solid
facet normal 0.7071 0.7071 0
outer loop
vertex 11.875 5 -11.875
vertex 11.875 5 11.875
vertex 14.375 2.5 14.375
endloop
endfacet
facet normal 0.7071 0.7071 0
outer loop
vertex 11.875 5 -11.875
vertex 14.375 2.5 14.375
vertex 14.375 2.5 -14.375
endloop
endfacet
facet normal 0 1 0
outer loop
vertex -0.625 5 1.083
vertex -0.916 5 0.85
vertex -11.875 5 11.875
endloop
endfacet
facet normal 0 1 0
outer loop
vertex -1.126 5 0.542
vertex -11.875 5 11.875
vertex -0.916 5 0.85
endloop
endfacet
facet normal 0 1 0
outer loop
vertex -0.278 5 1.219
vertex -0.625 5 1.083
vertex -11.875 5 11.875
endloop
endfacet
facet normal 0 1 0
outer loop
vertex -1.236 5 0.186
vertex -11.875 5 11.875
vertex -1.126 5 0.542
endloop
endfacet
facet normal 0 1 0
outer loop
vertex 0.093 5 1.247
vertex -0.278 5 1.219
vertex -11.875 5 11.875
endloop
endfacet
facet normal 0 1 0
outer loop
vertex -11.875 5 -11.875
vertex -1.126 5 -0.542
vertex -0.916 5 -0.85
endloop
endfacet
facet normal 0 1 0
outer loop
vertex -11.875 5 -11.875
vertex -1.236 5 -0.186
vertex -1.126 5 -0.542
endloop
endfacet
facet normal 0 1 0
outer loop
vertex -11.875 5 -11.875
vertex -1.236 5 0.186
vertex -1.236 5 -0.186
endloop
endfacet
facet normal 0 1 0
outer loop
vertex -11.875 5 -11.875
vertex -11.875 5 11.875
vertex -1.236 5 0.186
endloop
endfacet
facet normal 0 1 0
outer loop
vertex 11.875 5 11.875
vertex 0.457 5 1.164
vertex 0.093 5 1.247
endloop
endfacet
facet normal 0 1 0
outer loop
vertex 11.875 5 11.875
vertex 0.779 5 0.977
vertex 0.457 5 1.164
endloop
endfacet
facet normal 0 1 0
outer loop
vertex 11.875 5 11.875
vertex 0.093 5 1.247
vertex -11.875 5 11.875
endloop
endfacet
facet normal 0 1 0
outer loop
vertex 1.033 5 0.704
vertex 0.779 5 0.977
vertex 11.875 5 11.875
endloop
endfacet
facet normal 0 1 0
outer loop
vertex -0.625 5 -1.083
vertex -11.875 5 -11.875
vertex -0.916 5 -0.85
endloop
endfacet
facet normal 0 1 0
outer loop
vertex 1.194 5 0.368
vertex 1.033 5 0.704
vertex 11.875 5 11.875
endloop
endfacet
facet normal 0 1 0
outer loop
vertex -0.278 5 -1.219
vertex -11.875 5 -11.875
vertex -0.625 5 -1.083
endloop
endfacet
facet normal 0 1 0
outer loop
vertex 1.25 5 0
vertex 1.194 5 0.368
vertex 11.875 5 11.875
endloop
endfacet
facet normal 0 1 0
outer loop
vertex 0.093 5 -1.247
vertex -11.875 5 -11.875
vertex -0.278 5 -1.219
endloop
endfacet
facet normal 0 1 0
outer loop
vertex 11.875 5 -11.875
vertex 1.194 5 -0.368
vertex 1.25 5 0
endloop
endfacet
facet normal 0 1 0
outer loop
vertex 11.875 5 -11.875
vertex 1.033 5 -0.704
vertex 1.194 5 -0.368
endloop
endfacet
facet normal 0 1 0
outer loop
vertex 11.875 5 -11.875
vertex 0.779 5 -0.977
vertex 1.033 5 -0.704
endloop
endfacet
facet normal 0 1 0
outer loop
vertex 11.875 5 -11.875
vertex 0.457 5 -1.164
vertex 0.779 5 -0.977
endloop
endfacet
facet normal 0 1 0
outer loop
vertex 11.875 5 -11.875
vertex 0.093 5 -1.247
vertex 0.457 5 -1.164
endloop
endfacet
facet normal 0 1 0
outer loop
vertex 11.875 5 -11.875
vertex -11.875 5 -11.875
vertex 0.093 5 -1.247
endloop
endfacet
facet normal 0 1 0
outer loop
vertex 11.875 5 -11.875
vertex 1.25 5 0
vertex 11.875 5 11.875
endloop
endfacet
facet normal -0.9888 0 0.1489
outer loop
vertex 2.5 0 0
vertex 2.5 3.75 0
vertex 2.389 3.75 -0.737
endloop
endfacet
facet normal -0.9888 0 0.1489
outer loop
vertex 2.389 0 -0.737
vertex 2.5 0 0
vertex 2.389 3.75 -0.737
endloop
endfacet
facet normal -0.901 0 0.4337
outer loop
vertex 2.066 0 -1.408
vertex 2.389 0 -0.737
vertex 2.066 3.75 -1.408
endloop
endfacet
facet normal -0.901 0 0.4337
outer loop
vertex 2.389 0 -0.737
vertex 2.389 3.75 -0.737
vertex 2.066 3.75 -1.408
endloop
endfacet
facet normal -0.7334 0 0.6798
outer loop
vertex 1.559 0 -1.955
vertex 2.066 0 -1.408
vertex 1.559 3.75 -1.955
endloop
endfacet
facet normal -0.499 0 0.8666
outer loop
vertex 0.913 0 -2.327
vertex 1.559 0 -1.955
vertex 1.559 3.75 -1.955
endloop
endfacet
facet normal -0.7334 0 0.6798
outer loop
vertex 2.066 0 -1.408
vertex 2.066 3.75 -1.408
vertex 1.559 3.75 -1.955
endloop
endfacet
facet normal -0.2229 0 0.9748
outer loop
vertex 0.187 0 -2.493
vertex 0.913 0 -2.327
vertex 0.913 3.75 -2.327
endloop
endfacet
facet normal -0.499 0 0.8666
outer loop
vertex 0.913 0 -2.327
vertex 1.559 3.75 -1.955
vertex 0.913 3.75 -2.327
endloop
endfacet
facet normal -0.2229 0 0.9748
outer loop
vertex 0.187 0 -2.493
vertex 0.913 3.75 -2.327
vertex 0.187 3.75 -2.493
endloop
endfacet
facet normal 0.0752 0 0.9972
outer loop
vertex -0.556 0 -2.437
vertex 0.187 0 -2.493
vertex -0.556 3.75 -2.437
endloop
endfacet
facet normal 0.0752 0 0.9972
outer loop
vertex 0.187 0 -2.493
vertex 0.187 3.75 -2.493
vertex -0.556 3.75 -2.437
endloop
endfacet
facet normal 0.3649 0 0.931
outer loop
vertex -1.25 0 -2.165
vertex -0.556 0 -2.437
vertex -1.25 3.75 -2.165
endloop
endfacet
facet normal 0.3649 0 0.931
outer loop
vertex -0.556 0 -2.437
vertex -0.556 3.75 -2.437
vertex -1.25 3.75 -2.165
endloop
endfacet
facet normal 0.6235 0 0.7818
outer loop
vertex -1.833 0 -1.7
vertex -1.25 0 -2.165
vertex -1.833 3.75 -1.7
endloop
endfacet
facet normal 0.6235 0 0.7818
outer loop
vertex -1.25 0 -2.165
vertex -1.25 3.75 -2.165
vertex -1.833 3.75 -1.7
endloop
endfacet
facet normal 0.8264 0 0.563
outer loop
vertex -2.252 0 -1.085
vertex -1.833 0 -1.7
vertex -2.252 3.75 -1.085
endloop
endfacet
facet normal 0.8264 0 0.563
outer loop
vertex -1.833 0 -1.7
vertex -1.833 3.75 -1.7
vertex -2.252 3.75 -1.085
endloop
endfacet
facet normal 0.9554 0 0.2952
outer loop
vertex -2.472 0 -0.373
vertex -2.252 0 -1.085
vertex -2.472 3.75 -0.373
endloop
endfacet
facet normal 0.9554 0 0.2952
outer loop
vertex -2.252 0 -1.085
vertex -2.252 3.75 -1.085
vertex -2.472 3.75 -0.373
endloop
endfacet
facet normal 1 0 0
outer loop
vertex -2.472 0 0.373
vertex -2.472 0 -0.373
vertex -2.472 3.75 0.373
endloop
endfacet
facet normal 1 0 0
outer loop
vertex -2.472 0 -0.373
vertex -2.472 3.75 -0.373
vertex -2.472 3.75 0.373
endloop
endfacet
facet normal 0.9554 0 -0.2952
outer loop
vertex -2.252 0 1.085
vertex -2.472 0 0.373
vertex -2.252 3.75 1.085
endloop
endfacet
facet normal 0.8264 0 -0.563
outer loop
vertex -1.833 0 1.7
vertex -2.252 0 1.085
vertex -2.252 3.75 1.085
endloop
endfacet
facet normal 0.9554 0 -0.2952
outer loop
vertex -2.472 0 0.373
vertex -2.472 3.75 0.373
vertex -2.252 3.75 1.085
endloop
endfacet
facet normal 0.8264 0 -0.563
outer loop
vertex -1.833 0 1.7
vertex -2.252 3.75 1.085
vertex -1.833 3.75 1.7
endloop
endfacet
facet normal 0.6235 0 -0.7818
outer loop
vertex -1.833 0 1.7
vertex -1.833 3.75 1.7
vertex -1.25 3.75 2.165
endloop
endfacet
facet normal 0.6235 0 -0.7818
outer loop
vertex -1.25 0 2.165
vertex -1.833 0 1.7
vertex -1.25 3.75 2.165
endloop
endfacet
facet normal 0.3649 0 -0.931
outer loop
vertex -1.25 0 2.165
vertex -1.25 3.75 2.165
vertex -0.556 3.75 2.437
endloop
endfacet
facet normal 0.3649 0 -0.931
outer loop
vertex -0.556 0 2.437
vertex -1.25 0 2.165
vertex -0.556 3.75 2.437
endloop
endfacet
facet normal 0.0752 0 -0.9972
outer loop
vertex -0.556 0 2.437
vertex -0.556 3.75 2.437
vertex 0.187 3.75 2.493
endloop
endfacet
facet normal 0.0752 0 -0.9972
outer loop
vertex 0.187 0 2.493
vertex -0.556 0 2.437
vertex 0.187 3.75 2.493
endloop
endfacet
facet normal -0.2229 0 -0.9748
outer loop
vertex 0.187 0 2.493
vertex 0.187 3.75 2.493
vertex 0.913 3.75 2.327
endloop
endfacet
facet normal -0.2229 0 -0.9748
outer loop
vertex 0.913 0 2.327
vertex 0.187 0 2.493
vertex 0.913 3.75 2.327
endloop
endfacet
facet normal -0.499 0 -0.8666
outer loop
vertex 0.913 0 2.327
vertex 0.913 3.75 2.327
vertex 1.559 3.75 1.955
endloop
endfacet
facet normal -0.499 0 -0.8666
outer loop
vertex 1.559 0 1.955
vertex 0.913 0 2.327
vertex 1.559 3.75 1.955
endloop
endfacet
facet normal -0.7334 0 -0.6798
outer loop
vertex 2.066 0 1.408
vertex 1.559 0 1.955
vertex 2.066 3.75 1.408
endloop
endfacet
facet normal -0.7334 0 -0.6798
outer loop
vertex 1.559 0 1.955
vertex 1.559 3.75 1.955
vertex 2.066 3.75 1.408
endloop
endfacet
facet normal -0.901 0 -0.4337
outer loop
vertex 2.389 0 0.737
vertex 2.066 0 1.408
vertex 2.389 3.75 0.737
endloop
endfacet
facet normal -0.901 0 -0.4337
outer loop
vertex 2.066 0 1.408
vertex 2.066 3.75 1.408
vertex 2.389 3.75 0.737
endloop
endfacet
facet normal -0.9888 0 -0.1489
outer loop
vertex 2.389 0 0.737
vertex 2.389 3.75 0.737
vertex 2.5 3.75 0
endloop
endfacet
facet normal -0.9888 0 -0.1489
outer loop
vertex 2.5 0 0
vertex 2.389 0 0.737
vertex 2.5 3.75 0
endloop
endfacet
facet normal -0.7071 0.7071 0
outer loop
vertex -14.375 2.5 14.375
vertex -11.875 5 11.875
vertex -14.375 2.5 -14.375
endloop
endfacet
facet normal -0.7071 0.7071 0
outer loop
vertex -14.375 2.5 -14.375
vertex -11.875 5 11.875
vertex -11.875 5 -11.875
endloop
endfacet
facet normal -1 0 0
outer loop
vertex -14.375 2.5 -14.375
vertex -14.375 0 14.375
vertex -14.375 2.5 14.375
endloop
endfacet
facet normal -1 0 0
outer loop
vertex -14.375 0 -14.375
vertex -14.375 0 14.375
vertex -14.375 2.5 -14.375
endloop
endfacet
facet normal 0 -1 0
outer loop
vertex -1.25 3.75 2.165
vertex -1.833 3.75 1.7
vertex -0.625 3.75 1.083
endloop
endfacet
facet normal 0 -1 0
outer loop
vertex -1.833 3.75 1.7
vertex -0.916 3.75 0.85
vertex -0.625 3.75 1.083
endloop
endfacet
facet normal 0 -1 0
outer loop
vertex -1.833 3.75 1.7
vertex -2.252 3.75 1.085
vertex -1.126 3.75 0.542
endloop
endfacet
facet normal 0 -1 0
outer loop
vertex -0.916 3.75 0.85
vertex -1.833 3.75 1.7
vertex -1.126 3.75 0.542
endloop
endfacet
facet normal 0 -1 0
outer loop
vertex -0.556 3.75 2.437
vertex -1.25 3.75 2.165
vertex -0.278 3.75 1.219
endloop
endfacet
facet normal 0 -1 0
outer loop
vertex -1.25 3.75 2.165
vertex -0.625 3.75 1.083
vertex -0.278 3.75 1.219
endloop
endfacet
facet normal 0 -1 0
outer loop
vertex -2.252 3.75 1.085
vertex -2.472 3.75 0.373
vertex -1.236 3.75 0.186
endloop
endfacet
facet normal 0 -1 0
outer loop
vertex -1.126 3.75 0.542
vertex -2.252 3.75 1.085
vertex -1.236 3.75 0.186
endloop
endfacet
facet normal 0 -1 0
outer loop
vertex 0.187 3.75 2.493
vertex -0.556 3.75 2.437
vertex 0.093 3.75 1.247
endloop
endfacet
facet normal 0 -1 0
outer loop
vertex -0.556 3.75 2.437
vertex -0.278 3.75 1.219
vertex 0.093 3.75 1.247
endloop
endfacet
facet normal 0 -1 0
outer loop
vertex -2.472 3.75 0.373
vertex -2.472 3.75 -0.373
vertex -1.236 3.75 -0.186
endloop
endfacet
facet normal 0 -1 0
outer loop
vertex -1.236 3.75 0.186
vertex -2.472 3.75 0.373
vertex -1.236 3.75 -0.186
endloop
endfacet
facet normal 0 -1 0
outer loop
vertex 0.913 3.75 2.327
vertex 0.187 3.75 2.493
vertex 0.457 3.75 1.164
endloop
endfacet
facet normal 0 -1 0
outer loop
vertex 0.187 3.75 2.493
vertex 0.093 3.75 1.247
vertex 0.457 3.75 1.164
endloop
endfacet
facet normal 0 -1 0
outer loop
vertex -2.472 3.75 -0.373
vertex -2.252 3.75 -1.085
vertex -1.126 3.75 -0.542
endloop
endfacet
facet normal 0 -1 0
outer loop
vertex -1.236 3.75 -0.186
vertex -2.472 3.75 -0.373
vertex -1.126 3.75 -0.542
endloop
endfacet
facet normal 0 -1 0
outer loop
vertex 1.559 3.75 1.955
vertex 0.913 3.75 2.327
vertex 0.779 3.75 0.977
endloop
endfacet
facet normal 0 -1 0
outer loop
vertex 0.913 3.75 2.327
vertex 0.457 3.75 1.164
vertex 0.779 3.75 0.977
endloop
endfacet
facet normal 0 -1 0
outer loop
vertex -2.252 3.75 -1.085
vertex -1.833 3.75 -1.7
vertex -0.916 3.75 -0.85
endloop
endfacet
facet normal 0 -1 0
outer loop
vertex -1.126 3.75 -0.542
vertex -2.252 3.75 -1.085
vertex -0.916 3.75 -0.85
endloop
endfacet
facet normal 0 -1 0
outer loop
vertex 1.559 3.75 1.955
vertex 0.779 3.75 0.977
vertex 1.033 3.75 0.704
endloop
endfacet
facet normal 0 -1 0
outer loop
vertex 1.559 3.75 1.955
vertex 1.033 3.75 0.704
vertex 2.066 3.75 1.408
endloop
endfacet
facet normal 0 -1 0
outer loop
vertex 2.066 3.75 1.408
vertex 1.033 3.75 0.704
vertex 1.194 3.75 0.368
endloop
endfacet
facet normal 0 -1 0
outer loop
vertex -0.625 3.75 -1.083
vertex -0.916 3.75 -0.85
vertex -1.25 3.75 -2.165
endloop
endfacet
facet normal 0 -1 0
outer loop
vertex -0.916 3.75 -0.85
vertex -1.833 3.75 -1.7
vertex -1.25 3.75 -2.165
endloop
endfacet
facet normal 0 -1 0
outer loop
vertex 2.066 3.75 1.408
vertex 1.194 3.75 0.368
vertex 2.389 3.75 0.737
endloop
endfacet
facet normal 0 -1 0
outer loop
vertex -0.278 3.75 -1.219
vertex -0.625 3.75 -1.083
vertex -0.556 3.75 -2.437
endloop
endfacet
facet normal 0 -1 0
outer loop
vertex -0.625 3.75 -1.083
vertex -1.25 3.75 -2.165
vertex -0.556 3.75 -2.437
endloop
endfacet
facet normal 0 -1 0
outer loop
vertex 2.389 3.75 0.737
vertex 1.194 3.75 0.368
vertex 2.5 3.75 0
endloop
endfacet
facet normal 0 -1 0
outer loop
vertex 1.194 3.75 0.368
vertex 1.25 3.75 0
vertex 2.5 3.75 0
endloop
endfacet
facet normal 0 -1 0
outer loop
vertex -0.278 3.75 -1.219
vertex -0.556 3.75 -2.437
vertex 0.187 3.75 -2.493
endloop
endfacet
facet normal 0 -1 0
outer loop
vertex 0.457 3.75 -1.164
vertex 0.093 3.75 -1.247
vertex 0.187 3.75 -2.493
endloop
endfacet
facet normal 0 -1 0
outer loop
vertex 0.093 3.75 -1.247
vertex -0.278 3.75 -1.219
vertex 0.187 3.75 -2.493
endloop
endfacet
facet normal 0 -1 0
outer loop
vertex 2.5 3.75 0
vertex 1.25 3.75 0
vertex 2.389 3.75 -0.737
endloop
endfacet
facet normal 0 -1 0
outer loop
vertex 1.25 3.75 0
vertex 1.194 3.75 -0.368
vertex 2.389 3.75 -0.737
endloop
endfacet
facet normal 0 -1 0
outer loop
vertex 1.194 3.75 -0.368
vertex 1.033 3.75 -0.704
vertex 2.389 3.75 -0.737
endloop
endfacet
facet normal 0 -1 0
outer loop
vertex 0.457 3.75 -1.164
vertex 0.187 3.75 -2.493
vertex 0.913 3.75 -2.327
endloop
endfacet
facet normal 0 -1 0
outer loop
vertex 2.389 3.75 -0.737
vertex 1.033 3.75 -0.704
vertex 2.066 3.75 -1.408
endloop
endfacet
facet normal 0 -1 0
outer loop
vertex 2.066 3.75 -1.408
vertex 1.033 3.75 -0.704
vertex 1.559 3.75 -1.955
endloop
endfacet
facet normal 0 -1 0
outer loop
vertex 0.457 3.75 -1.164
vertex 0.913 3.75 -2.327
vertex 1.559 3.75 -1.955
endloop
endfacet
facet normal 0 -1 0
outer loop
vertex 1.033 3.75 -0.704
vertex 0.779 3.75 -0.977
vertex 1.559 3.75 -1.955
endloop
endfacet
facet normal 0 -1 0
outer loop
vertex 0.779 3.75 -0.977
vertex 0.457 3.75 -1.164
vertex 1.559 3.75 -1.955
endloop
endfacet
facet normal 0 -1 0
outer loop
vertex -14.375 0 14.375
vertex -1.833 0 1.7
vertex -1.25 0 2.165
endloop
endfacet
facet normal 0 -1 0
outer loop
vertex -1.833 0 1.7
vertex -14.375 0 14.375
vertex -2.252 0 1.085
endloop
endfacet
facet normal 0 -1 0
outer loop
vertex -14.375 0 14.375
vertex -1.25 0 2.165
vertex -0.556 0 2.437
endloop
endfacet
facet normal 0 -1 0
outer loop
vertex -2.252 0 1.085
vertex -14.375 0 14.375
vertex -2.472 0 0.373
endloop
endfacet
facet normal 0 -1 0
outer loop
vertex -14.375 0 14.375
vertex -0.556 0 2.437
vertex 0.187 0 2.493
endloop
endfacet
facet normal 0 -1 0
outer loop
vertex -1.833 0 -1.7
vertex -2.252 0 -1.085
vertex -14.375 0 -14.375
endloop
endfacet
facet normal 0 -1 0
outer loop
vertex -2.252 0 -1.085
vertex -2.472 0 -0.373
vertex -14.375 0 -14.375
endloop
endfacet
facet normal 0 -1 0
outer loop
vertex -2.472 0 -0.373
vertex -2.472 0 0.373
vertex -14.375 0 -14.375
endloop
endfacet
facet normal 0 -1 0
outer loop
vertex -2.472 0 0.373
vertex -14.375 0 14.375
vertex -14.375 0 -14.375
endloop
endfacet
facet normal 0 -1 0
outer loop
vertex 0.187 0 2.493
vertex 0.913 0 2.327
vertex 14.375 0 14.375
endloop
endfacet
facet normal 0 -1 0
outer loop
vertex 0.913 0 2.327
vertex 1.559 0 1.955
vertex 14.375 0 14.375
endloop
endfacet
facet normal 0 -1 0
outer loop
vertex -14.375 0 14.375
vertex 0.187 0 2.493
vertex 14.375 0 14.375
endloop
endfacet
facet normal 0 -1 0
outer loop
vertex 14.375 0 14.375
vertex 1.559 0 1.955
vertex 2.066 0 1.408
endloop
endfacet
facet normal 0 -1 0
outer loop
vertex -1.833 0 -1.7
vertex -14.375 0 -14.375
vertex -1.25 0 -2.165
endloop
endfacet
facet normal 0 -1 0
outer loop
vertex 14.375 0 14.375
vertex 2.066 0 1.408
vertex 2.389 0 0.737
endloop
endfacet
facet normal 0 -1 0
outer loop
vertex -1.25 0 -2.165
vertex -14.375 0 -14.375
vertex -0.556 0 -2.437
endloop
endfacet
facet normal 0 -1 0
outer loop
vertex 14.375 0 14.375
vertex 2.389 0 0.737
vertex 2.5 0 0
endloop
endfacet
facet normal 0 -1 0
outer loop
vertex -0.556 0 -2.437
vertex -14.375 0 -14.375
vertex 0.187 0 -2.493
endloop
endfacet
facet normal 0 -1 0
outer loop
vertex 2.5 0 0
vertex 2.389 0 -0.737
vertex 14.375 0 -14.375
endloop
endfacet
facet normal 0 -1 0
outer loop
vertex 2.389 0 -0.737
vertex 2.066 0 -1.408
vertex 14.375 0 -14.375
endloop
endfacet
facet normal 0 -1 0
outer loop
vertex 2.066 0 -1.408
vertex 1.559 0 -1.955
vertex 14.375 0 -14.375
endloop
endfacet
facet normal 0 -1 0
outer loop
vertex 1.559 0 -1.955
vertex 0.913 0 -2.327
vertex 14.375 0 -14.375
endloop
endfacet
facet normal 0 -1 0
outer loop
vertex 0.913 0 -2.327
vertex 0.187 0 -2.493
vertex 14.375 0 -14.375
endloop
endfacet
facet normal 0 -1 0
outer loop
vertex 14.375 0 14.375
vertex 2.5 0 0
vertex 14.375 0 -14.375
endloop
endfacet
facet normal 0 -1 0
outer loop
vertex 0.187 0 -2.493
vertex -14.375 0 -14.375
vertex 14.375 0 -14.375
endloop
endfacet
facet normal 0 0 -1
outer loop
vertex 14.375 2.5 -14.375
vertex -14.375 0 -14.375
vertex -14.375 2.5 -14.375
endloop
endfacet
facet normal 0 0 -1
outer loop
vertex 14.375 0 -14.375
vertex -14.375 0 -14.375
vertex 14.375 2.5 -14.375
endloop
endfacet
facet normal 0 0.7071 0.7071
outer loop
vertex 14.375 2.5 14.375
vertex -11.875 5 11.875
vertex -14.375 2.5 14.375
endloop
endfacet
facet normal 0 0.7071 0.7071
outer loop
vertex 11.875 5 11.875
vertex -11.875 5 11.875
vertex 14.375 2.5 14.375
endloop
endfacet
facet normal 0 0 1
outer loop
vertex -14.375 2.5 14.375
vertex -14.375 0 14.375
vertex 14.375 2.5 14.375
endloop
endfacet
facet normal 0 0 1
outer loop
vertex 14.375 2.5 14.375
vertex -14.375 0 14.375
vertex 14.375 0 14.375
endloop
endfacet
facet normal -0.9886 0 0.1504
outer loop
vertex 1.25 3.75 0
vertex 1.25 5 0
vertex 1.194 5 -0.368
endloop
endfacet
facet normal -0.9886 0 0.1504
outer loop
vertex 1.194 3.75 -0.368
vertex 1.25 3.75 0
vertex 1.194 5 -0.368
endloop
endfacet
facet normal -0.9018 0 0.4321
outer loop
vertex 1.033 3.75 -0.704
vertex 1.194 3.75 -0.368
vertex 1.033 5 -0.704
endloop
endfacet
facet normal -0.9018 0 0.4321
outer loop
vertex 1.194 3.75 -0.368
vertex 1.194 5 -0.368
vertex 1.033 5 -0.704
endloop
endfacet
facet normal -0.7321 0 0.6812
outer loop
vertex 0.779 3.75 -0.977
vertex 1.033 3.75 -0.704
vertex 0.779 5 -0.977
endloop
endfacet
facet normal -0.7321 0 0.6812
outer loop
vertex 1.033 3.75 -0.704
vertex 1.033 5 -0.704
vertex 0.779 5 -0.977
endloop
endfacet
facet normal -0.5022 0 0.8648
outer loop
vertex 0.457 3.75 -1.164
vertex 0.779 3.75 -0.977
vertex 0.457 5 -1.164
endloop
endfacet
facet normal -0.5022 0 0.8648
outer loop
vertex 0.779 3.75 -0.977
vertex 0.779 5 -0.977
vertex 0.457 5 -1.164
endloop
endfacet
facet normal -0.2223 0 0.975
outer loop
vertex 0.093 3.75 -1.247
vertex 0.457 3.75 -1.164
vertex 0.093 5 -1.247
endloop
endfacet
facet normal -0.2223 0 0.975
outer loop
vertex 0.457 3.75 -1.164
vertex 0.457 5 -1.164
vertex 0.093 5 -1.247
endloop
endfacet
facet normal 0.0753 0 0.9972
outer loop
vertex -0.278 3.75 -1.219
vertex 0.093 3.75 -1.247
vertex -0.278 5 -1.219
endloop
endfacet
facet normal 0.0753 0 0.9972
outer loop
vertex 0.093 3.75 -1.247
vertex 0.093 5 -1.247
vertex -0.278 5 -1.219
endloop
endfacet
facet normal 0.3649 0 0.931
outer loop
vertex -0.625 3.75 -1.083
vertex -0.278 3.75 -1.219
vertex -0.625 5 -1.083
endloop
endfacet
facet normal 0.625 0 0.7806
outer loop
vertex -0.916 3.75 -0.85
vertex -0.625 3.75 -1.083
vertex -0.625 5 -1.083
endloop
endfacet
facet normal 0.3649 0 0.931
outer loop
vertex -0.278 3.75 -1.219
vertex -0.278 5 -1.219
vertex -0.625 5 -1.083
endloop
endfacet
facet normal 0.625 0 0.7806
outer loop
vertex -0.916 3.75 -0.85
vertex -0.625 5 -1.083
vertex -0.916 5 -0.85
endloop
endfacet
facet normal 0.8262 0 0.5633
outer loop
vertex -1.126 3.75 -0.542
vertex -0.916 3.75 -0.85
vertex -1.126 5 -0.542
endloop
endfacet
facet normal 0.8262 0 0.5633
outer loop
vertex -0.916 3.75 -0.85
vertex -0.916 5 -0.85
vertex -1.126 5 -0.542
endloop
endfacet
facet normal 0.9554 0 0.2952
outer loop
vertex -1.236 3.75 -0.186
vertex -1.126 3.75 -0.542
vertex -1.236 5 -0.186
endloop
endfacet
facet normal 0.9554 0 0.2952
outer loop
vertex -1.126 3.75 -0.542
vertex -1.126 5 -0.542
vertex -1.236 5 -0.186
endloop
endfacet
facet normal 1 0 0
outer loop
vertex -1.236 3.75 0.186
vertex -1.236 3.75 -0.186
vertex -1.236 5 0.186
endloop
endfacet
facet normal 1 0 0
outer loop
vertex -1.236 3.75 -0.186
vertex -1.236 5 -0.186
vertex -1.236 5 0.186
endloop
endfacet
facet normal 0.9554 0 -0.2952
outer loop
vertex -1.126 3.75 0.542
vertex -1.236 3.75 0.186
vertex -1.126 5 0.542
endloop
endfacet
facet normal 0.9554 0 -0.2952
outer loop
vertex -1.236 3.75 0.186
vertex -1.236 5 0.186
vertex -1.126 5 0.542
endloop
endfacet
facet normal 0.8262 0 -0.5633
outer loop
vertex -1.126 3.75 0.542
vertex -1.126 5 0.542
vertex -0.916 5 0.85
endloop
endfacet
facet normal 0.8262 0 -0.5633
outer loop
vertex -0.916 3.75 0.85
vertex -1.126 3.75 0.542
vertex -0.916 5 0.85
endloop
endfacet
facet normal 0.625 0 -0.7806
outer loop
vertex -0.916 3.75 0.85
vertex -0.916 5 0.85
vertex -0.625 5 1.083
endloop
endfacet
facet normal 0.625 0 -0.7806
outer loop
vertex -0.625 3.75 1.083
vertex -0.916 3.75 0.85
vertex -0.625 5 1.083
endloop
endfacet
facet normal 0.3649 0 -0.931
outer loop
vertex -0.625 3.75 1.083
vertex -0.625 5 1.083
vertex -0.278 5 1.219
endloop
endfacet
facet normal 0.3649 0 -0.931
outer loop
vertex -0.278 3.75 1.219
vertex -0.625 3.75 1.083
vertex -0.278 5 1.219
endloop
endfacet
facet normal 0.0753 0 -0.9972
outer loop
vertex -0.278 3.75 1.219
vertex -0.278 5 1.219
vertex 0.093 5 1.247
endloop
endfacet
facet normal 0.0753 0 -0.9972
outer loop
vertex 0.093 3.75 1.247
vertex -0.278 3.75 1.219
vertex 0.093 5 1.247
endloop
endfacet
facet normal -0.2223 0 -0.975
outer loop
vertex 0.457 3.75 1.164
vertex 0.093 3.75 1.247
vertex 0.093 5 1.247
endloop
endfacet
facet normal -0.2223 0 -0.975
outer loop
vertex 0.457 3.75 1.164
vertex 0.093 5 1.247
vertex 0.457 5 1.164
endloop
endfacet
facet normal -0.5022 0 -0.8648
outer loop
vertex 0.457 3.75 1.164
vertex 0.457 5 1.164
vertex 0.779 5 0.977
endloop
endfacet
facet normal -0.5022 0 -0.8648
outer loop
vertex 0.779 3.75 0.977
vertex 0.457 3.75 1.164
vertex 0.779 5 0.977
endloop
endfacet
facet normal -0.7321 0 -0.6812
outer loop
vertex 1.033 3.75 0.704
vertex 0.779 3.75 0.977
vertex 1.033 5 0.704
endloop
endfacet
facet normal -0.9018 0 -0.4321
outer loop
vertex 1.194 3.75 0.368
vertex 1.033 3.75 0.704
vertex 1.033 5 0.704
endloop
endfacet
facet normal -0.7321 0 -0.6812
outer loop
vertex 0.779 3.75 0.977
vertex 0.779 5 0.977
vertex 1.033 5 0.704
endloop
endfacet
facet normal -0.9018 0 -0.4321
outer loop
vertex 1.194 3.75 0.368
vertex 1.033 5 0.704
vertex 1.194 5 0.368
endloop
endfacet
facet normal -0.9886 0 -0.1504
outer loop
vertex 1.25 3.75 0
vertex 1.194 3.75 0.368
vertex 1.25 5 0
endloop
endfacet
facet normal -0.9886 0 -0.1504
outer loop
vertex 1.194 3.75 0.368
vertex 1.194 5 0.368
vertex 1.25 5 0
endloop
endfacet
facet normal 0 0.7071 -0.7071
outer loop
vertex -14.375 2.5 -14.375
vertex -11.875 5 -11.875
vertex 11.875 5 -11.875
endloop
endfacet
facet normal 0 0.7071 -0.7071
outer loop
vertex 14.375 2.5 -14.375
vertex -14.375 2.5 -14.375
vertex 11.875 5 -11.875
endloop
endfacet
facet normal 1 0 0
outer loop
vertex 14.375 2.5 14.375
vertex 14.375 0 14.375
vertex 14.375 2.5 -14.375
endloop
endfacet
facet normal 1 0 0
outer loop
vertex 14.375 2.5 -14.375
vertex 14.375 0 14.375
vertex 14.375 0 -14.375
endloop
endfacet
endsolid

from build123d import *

# Parameters (mm, degrees)
SKETCH2_W           = 28.75
SKETCH2_H           = 28.75
BOSS_EXTRUDE1_DEPTH = 5
CHAMFER1_SIZE       = 2.5
SKETCH3_R           = 1.25
CUT_EXTRUDE1_DEPTH  = 1.25
SKETCH6_R           = 2.5
CUT_EXTRUDE2_DEPTH  = 3.75


with BuildPart() as part:
    # Sketch2 → Boss-Extrude1 (new body)
    with BuildSketch(Plane(origin=(0, 0, 0), x_dir=(1, 0, 0), z_dir=(0, 1, 0))):
        Rectangle(SKETCH2_W, SKETCH2_H)
    extrude(amount=BOSS_EXTRUDE1_DEPTH)

    # Chamfer1
    chamfer1_edges = [part.edges().sort_by_distance(p)[0] for p in [
        (-14.375, 5, 0),
        (0, 5, 14.375),
        (14.375, 5, 0),
        (0, 5, -14.375),
    ]]
    chamfer(chamfer1_edges, length=CHAMFER1_SIZE)

    # Sketch3 → Cut-Extrude1 (cut)
    with BuildSketch(Plane(origin=(0, 5, 0), x_dir=(1, 0, 0), z_dir=(0, 1, 0))):
        Circle(SKETCH3_R)
    extrude(amount=-CUT_EXTRUDE1_DEPTH, mode=Mode.SUBTRACT)

    # Sketch6 → Cut-Extrude2 (cut)
    with BuildSketch(Plane(origin=(0, 3.75, 0), x_dir=(1, 0, 0), z_dir=(0, 1, 0))):
        Circle(SKETCH6_R)
    extrude(amount=-CUT_EXTRUDE2_DEPTH, mode=Mode.SUBTRACT)


solid = part.part
